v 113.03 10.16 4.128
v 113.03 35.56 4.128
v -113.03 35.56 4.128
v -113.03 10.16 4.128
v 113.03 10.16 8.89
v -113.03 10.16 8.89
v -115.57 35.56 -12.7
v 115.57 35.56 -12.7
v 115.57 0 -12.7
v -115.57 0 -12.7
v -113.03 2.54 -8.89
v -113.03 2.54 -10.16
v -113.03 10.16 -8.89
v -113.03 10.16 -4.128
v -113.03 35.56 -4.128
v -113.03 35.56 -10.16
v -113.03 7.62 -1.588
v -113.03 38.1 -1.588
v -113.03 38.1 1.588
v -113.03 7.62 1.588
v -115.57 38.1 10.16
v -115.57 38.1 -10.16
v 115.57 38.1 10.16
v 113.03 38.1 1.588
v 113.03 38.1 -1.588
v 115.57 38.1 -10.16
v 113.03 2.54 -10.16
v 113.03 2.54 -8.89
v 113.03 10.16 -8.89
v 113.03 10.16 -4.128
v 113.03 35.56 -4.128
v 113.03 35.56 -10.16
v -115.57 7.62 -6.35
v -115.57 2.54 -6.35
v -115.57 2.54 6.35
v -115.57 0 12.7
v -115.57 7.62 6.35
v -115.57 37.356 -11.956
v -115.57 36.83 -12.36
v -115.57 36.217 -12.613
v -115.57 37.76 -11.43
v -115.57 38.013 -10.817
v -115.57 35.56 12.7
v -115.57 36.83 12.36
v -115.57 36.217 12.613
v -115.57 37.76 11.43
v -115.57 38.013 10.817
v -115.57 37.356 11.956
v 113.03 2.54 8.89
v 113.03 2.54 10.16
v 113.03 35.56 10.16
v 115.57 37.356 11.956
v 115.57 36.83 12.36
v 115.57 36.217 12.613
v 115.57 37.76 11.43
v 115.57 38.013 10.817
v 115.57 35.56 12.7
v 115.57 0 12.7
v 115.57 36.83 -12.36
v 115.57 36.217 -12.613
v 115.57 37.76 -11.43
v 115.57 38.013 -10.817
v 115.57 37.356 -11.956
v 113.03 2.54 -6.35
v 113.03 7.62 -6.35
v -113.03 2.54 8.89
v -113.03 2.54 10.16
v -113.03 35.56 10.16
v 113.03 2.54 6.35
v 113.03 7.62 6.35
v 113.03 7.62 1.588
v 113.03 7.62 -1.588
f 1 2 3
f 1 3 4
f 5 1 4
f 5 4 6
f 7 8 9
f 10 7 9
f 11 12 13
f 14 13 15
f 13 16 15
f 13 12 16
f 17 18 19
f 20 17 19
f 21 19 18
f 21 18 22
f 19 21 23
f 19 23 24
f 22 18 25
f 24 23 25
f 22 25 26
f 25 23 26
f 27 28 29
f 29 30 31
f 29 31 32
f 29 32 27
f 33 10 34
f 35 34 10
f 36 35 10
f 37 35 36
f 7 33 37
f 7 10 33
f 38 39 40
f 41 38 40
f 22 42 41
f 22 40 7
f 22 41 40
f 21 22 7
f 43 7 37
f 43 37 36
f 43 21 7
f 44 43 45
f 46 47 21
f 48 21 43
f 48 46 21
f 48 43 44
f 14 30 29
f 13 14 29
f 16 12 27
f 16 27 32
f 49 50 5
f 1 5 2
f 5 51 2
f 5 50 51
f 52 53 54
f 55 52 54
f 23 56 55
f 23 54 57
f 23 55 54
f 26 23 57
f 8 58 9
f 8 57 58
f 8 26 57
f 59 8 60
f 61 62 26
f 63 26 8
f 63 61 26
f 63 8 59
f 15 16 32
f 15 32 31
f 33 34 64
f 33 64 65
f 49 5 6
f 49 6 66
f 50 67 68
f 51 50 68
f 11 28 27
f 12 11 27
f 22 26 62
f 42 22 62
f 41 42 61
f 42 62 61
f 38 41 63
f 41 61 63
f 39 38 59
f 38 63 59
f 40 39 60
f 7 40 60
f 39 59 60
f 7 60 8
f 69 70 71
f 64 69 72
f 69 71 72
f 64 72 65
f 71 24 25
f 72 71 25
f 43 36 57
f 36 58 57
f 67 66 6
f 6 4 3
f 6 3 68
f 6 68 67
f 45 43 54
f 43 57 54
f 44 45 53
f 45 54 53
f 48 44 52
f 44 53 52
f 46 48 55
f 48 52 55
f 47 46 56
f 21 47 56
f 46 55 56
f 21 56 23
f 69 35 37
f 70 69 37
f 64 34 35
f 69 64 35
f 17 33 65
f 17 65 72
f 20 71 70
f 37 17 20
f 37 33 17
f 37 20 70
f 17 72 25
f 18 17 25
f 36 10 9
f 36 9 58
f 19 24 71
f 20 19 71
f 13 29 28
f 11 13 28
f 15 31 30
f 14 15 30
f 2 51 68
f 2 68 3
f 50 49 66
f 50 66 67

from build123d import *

# Parameters (mm, degrees)
BOSS_EXTRUDE1_DEPTH = 114.3
BOSS_EXTRUDE2_START = 114.3
BOSS_EXTRUDE2_DEPTH = 1.27
SKETCH4_W           = 12.7
SKETCH4_H           = 5.08
BOSS_EXTRUDE4_DEPTH = 1.27


with BuildPart() as part:
    # Sketch1 → Boss-Extrude1 (new, symmetric)
    with BuildSketch(Plane(origin=(0, 0, 0), x_dir=(0, 0, -1), z_dir=(1, 0, 0))):
        with BuildLine():
            Line((12.7, 0), (-12.7, 0))
            Line((-12.7, 0), (-12.7, 35.56))
            ThreePointArc((-12.7, 35.56), (-11.956051224, 37.356051224), (-10.16, 38.1))
            Line((-10.16, 38.1), (-1.5875, 38.1))
            Line((-1.5875, 38.1), (-1.5875, 7.62))
            Line((-1.5875, 7.62), (-6.35, 7.62))
            Line((-6.35, 7.62), (-6.35, 2.54))
            Line((-6.35, 2.54), (6.35, 2.54))
            Line((6.35, 2.54), (6.35, 7.62))
            Line((6.35, 7.62), (1.5875, 7.62))
            Line((1.5875, 7.62), (1.5875, 38.1))
            Line((1.5875, 38.1), (10.16, 38.1))
            ThreePointArc((10.16, 38.1), (11.956051224, 37.356051224), (12.7, 35.56))
            Line((12.7, 35.56), (12.7, 0))
        make_face()
        Polygon((10.16, 35.56), (4.1275, 35.56), (4.1275, 10.16), (8.89, 10.16), (8.89, 2.54), (10.16, 2.54), align=None, mode=Mode.SUBTRACT)
        Polygon((-4.1275, 10.16), (-8.89, 10.16), (-8.89, 2.54), (-10.16, 2.54), (-10.16, 35.56), (-4.1275, 35.56), align=None, mode=Mode.SUBTRACT)
    extrude(amount=BOSS_EXTRUDE1_DEPTH, both=True)

    # Sketch2 → Boss-Extrude2 (add, symmetric)
    with BuildSketch(Plane(origin=(0, 0, 0), x_dir=(0, 0, -1), z_dir=(1, 0, 0)).offset(BOSS_EXTRUDE2_START)):
        with BuildLine():
            Line((-12.7, 0), (12.7, 0))
            Line((12.7, 0), (12.7, 35.56))
            ThreePointArc((12.7, 35.56), (11.956051224, 37.356051224), (10.16, 38.1))
            Line((10.16, 38.1), (-10.16, 38.1))
            ThreePointArc((-10.16, 38.1), (-11.956051224, 37.356051224), (-12.7, 35.56))
            Line((-12.7, 35.56), (-12.7, 0))
        make_face()
    extrude(amount=BOSS_EXTRUDE2_DEPTH, both=True)

    # Sketch4 → Boss-Extrude4 (add, symmetric)
    with BuildSketch(Plane.ZY.offset(114.3)):
        with BuildLine():
            Line((-12.7, 0), (12.7, 0))
            Line((12.7, 0), (12.7, 35.56))
            ThreePointArc((12.7, 35.56), (11.956051224, 37.356051224), (10.16, 38.1))
            Line((10.16, 38.1), (-10.16, 38.1))
            ThreePointArc((-10.16, 38.1), (-11.956051224, 37.356051224), (-12.7, 35.56))
            Line((-12.7, 35.56), (-12.7, 0))
        make_face()
        with Locations((0, 5.08)):
            Rectangle(SKETCH4_W, SKETCH4_H, mode=Mode.SUBTRACT)
    extrude(amount=BOSS_EXTRUDE4_DEPTH, both=True)


solid = part.part
